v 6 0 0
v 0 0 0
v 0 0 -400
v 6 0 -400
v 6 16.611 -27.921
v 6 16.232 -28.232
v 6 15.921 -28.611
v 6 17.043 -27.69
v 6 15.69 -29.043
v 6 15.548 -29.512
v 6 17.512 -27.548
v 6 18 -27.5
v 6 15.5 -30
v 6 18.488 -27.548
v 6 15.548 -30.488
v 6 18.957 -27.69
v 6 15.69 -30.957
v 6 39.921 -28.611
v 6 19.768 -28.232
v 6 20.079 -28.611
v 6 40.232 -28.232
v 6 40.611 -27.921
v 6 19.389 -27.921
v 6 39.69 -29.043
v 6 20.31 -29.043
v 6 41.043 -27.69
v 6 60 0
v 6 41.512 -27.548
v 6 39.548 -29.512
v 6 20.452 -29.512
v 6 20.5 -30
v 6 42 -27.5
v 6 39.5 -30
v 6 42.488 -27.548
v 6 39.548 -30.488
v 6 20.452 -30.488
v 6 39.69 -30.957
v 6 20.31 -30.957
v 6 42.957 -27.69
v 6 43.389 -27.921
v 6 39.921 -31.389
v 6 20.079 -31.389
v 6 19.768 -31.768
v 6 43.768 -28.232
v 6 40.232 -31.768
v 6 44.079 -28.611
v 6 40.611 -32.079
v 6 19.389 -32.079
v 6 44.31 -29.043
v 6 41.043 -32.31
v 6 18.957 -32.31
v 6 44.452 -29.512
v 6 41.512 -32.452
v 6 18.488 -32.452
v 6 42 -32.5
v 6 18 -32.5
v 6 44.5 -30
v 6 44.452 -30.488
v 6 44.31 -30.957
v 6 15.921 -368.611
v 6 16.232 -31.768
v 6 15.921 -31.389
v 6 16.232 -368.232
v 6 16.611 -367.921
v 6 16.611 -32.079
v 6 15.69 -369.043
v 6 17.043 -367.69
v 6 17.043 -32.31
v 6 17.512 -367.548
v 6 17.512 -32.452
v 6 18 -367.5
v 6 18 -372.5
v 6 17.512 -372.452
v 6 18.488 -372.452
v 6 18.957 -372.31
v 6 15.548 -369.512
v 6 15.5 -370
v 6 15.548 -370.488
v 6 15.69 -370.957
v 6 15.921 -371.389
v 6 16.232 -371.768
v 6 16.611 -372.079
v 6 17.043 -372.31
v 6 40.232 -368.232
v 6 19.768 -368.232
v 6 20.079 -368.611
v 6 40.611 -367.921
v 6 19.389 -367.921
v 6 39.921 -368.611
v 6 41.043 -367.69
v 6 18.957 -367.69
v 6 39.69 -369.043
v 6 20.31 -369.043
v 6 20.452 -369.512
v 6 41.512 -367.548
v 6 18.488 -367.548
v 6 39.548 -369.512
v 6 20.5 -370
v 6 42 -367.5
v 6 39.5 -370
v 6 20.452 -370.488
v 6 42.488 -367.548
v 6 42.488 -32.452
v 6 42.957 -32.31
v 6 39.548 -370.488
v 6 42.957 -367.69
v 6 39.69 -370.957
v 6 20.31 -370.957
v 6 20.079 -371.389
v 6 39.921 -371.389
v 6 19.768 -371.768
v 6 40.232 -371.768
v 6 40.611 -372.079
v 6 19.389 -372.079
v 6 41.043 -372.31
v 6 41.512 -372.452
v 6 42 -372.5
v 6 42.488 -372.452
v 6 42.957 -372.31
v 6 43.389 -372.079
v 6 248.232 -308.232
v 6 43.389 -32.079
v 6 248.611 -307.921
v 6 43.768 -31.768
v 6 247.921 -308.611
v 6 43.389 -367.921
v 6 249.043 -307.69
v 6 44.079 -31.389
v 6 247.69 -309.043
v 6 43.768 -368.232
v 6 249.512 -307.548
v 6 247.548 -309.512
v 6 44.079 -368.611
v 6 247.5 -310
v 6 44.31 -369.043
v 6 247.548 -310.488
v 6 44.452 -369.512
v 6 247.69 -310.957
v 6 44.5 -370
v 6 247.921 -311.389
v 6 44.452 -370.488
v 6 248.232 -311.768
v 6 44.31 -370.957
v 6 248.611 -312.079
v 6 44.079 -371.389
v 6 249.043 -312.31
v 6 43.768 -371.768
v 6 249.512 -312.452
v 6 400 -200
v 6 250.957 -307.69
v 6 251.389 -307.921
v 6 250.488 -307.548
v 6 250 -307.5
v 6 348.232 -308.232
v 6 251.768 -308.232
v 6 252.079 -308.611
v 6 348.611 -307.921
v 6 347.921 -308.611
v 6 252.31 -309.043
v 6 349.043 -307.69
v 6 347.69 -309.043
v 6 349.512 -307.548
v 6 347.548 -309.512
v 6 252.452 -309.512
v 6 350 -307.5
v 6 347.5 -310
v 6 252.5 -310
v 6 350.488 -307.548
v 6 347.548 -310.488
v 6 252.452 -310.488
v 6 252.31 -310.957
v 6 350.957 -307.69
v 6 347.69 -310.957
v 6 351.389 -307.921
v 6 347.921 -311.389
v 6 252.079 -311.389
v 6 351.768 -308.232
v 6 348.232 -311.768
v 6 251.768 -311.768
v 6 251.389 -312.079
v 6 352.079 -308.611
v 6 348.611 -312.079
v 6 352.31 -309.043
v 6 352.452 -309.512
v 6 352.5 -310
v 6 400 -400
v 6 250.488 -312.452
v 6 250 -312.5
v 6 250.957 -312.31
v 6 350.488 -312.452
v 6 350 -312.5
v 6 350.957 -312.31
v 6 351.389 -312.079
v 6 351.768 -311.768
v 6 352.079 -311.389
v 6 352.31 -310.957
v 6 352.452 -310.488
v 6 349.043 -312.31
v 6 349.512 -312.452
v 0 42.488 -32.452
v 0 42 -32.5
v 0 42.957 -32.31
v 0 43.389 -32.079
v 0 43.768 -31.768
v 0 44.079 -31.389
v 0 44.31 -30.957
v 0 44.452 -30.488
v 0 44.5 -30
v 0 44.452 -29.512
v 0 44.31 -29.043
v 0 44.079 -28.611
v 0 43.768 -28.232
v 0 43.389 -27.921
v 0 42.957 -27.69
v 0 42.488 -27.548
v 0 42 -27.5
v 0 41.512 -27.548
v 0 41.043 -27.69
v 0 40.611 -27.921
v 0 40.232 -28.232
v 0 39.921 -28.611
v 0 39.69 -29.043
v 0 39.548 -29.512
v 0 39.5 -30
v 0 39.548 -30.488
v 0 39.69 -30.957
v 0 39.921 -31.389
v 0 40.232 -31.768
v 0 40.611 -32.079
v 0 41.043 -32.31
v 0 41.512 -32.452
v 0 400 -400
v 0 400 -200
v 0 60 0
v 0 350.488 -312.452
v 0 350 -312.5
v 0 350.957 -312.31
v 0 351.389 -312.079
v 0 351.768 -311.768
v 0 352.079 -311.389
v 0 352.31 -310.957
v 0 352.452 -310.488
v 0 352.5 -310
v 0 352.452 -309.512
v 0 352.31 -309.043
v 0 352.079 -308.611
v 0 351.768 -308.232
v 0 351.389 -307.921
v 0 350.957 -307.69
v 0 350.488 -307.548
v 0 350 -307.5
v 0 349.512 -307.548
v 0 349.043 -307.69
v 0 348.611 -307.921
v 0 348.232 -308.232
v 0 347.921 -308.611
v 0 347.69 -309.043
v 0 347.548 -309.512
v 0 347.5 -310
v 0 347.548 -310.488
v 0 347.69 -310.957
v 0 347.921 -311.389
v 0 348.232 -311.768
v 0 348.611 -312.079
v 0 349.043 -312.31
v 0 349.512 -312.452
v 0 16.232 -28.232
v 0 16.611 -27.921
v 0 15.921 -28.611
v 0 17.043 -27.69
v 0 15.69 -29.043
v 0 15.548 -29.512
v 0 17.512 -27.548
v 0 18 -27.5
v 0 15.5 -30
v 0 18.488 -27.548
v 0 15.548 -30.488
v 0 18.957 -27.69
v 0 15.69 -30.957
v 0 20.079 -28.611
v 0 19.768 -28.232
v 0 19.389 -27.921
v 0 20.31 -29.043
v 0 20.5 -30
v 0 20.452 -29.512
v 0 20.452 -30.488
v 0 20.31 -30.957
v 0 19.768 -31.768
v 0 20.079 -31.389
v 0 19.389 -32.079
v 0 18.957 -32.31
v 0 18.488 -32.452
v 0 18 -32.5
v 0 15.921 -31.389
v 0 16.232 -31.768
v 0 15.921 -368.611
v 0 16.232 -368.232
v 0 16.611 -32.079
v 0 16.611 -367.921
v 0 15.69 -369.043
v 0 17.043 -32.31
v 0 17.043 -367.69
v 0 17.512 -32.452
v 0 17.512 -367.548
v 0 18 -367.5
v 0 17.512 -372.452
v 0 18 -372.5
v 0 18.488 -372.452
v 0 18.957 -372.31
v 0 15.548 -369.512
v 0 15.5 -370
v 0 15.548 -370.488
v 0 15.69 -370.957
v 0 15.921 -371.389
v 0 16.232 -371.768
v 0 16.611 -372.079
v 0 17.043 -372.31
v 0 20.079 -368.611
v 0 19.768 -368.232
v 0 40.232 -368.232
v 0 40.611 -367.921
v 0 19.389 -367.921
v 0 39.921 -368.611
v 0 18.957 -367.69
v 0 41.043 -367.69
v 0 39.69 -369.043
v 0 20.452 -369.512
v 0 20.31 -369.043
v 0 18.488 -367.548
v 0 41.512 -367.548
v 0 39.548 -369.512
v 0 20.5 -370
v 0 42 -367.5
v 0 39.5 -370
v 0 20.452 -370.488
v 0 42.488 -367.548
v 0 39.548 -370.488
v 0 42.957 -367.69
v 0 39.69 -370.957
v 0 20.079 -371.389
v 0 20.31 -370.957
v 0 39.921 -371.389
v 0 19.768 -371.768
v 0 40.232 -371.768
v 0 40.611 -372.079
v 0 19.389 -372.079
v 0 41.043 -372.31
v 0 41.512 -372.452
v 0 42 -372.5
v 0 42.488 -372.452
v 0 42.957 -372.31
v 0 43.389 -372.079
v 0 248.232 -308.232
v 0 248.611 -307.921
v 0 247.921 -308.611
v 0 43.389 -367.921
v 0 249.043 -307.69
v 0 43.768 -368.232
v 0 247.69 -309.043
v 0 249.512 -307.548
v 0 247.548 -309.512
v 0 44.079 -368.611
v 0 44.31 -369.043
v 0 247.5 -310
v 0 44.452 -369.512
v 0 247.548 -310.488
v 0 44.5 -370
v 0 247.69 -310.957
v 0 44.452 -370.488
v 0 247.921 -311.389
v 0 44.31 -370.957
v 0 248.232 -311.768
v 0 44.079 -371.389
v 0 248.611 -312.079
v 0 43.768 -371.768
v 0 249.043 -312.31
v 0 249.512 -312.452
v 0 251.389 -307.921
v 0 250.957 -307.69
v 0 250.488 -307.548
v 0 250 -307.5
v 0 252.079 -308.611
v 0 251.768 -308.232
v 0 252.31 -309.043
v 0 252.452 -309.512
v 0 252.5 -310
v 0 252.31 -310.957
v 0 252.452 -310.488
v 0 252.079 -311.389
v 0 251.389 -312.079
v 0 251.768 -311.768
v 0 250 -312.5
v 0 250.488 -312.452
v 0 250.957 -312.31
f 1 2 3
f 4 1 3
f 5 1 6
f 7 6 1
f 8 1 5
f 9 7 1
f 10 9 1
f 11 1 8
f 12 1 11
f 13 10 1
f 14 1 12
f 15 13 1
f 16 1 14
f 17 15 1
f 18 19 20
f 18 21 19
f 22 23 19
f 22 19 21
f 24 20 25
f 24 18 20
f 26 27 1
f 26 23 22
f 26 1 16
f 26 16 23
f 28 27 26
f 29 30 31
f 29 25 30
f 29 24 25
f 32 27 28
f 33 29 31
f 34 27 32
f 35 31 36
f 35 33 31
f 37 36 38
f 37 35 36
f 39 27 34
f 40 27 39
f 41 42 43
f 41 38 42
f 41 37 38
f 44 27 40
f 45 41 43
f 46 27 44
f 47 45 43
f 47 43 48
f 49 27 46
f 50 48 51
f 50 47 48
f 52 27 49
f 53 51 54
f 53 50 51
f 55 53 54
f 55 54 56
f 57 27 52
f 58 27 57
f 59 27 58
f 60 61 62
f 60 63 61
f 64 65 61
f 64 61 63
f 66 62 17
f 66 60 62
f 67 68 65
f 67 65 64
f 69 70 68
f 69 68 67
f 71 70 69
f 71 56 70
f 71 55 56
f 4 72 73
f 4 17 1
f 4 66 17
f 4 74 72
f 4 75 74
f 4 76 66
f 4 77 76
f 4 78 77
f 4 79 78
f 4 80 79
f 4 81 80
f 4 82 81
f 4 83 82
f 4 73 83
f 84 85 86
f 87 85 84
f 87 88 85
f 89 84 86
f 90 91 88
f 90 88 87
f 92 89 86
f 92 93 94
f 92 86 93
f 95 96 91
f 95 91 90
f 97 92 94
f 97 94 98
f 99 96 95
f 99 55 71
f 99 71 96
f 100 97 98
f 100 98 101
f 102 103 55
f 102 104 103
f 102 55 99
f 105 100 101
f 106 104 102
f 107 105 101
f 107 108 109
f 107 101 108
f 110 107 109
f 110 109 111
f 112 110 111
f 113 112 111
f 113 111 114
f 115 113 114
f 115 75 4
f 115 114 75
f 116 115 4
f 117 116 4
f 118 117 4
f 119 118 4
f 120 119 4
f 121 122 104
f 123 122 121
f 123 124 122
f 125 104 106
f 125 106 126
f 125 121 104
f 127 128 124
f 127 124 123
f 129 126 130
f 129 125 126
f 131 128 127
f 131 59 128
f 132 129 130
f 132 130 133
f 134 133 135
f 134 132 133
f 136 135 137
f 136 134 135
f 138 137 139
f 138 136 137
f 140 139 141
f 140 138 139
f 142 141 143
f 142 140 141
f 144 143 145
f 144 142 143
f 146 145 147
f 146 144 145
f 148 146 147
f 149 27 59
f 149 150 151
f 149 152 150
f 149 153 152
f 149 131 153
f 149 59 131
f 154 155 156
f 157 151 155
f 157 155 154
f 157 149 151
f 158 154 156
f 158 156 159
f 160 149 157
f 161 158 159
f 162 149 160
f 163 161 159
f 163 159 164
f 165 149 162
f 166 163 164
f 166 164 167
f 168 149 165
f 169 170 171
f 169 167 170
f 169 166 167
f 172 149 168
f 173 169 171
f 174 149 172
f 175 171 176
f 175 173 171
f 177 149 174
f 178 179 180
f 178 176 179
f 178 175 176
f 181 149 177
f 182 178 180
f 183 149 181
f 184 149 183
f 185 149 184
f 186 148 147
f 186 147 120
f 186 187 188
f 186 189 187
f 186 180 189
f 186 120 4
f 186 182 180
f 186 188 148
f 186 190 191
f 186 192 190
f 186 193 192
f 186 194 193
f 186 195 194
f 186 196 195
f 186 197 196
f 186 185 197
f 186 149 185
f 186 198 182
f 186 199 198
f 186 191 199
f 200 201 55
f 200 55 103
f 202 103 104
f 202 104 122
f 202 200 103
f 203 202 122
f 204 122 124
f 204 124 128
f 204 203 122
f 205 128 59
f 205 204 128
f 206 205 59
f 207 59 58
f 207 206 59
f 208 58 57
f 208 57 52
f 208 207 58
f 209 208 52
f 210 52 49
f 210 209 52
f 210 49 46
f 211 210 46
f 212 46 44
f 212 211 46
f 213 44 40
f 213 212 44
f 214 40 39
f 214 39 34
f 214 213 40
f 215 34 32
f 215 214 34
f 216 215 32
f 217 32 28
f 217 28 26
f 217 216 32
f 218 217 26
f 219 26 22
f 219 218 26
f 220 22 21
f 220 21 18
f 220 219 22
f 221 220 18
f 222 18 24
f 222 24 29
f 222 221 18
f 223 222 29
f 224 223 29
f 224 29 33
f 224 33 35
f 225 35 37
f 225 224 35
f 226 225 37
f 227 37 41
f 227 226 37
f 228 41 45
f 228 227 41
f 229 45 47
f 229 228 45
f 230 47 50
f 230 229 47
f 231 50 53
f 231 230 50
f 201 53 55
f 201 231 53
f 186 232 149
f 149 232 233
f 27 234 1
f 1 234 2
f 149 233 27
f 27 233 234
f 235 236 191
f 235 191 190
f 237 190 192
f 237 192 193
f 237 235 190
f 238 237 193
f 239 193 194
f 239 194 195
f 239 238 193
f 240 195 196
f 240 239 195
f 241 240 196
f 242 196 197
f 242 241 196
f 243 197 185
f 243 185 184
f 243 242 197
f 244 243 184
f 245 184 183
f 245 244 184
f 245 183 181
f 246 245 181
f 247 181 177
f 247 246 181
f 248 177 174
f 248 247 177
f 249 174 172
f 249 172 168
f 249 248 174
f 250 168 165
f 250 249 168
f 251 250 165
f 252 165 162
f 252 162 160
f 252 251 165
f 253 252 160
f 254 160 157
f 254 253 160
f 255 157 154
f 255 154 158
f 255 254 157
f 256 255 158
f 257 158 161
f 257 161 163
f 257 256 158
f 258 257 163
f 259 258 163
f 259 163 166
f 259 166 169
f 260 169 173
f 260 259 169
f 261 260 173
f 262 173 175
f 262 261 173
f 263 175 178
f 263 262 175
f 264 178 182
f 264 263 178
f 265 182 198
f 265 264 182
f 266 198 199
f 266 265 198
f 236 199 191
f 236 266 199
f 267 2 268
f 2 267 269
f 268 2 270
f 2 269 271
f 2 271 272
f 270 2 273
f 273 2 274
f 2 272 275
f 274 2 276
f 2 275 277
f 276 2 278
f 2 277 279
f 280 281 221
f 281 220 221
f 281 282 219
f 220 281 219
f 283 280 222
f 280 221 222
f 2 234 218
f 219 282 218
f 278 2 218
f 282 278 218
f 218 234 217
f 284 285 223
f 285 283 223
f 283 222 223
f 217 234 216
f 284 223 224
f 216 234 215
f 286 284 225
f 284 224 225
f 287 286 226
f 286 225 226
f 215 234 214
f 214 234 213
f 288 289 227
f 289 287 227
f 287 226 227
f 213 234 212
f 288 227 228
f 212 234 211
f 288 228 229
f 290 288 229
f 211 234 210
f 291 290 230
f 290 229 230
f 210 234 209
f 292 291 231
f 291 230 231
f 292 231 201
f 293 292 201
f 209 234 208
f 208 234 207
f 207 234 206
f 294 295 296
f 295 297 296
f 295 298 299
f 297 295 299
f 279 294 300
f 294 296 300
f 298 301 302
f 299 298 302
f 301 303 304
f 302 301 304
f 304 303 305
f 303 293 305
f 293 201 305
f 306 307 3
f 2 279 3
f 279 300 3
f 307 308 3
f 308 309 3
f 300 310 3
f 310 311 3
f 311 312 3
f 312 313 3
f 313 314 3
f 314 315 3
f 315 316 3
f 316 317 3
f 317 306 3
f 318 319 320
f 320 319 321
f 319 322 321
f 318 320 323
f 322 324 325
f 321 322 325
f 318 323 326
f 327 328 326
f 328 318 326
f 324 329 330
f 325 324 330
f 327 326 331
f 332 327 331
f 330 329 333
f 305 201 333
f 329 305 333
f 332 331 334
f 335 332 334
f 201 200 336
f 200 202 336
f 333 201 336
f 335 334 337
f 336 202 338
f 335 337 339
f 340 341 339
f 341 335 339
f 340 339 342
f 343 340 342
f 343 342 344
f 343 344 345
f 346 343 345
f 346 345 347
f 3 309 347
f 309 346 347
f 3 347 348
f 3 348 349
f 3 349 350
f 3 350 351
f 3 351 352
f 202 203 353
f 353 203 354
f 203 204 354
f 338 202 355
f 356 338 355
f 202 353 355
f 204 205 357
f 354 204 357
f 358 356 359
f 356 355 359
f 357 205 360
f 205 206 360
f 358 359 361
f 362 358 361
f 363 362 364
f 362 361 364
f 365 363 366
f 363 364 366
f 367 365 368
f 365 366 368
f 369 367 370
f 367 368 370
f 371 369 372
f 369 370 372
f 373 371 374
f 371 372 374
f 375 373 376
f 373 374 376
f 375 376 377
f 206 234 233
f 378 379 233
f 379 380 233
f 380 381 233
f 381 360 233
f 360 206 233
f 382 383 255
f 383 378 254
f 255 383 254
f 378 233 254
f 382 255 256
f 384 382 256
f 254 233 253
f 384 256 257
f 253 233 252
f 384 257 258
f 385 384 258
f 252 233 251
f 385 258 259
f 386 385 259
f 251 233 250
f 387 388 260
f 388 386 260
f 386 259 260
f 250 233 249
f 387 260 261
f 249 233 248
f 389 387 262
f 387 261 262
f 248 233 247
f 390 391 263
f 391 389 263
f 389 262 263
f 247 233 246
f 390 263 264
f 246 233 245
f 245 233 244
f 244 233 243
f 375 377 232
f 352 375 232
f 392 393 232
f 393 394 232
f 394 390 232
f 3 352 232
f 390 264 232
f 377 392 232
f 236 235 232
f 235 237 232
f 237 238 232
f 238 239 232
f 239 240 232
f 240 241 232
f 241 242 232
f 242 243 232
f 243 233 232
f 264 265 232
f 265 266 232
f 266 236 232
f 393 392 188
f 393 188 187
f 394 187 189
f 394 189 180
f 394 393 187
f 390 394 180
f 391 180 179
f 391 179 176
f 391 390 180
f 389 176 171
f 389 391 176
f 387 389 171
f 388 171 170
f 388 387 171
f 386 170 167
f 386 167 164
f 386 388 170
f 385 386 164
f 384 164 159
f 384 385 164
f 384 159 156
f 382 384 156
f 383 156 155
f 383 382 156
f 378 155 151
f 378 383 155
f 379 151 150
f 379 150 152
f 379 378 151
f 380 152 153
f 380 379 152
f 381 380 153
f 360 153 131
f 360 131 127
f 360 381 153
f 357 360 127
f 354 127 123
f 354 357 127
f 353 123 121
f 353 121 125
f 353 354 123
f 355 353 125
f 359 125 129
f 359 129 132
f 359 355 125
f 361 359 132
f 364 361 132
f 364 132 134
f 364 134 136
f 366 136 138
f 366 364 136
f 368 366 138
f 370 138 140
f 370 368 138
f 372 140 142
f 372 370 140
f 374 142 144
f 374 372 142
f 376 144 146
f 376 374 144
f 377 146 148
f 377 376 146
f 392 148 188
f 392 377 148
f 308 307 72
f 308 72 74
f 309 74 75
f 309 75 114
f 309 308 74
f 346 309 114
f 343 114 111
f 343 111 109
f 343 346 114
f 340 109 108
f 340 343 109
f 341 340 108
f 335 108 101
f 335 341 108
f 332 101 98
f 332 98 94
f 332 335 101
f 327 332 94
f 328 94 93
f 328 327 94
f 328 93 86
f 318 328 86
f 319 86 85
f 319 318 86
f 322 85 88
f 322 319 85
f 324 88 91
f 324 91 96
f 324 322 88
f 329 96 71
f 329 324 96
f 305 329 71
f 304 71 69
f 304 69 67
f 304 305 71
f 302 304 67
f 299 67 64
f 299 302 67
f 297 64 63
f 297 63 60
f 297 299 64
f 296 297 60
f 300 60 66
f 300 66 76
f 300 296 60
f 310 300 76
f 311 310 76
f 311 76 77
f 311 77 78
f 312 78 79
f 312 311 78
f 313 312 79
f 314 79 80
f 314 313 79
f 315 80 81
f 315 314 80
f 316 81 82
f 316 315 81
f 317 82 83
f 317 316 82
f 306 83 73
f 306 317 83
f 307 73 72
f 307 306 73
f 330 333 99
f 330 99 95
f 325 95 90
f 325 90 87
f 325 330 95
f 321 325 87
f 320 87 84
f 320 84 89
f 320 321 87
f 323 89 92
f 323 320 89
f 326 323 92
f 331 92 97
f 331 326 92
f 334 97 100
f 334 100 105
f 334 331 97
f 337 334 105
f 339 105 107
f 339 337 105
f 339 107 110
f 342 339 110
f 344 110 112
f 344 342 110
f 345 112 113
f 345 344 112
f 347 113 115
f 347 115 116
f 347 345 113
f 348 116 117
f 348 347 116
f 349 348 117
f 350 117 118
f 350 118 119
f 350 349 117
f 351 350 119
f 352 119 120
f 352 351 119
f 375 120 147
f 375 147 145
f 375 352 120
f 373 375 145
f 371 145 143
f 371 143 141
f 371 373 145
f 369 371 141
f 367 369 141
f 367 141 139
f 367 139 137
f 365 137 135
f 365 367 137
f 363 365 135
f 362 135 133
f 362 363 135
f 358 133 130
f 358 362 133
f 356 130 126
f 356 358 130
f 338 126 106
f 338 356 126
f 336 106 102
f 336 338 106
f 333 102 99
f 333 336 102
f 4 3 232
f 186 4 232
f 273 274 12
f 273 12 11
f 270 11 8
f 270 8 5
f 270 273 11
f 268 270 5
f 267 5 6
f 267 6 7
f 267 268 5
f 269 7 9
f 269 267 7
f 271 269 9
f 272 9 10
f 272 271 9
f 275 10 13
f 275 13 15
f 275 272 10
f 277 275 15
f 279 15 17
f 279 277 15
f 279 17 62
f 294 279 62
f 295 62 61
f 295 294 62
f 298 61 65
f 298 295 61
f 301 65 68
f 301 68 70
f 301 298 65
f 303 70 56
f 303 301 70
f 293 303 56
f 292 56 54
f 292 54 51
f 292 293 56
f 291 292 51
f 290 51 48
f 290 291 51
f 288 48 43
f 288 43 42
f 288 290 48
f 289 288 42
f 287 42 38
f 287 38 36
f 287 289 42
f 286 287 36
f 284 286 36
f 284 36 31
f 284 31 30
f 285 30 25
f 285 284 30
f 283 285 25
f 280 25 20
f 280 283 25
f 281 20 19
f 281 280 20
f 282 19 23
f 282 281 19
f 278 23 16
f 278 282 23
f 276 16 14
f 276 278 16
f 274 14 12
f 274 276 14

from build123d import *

# Parameters (mm, degrees)
SKETCH1_R           = 2.5
BOSS_EXTRUDE1_DEPTH = 6


with BuildPart() as part:
    # Sketch1 → Boss-Extrude1 (new body)
    with BuildSketch(Plane(origin=(0, 0, 0), x_dir=(0, 0, -1), z_dir=(1, 0, 0))):
        Polygon((0, 0), (400, 0), (400, 400), (200, 400), (0, 60), align=None)
        with Locations((30, 42)):
            Circle(SKETCH1_R, mode=Mode.SUBTRACT)
        with Locations(Location((30, 18, 0), (0, 0, 180))):
            Circle(SKETCH1_R, mode=Mode.SUBTRACT)
        with Locations((370, 18)):
            Circle(SKETCH1_R, mode=Mode.SUBTRACT)
        with Locations(Location((370, 42, 0), (0, 0, 180))):
            Circle(SKETCH1_R, mode=Mode.SUBTRACT)
        with Locations((310, 350)):
            Circle(SKETCH1_R, mode=Mode.SUBTRACT)
        with Locations((310, 250)):
            Circle(SKETCH1_R, mode=Mode.SUBTRACT)
    extrude(amount=BOSS_EXTRUDE1_DEPTH)


solid = part.part
